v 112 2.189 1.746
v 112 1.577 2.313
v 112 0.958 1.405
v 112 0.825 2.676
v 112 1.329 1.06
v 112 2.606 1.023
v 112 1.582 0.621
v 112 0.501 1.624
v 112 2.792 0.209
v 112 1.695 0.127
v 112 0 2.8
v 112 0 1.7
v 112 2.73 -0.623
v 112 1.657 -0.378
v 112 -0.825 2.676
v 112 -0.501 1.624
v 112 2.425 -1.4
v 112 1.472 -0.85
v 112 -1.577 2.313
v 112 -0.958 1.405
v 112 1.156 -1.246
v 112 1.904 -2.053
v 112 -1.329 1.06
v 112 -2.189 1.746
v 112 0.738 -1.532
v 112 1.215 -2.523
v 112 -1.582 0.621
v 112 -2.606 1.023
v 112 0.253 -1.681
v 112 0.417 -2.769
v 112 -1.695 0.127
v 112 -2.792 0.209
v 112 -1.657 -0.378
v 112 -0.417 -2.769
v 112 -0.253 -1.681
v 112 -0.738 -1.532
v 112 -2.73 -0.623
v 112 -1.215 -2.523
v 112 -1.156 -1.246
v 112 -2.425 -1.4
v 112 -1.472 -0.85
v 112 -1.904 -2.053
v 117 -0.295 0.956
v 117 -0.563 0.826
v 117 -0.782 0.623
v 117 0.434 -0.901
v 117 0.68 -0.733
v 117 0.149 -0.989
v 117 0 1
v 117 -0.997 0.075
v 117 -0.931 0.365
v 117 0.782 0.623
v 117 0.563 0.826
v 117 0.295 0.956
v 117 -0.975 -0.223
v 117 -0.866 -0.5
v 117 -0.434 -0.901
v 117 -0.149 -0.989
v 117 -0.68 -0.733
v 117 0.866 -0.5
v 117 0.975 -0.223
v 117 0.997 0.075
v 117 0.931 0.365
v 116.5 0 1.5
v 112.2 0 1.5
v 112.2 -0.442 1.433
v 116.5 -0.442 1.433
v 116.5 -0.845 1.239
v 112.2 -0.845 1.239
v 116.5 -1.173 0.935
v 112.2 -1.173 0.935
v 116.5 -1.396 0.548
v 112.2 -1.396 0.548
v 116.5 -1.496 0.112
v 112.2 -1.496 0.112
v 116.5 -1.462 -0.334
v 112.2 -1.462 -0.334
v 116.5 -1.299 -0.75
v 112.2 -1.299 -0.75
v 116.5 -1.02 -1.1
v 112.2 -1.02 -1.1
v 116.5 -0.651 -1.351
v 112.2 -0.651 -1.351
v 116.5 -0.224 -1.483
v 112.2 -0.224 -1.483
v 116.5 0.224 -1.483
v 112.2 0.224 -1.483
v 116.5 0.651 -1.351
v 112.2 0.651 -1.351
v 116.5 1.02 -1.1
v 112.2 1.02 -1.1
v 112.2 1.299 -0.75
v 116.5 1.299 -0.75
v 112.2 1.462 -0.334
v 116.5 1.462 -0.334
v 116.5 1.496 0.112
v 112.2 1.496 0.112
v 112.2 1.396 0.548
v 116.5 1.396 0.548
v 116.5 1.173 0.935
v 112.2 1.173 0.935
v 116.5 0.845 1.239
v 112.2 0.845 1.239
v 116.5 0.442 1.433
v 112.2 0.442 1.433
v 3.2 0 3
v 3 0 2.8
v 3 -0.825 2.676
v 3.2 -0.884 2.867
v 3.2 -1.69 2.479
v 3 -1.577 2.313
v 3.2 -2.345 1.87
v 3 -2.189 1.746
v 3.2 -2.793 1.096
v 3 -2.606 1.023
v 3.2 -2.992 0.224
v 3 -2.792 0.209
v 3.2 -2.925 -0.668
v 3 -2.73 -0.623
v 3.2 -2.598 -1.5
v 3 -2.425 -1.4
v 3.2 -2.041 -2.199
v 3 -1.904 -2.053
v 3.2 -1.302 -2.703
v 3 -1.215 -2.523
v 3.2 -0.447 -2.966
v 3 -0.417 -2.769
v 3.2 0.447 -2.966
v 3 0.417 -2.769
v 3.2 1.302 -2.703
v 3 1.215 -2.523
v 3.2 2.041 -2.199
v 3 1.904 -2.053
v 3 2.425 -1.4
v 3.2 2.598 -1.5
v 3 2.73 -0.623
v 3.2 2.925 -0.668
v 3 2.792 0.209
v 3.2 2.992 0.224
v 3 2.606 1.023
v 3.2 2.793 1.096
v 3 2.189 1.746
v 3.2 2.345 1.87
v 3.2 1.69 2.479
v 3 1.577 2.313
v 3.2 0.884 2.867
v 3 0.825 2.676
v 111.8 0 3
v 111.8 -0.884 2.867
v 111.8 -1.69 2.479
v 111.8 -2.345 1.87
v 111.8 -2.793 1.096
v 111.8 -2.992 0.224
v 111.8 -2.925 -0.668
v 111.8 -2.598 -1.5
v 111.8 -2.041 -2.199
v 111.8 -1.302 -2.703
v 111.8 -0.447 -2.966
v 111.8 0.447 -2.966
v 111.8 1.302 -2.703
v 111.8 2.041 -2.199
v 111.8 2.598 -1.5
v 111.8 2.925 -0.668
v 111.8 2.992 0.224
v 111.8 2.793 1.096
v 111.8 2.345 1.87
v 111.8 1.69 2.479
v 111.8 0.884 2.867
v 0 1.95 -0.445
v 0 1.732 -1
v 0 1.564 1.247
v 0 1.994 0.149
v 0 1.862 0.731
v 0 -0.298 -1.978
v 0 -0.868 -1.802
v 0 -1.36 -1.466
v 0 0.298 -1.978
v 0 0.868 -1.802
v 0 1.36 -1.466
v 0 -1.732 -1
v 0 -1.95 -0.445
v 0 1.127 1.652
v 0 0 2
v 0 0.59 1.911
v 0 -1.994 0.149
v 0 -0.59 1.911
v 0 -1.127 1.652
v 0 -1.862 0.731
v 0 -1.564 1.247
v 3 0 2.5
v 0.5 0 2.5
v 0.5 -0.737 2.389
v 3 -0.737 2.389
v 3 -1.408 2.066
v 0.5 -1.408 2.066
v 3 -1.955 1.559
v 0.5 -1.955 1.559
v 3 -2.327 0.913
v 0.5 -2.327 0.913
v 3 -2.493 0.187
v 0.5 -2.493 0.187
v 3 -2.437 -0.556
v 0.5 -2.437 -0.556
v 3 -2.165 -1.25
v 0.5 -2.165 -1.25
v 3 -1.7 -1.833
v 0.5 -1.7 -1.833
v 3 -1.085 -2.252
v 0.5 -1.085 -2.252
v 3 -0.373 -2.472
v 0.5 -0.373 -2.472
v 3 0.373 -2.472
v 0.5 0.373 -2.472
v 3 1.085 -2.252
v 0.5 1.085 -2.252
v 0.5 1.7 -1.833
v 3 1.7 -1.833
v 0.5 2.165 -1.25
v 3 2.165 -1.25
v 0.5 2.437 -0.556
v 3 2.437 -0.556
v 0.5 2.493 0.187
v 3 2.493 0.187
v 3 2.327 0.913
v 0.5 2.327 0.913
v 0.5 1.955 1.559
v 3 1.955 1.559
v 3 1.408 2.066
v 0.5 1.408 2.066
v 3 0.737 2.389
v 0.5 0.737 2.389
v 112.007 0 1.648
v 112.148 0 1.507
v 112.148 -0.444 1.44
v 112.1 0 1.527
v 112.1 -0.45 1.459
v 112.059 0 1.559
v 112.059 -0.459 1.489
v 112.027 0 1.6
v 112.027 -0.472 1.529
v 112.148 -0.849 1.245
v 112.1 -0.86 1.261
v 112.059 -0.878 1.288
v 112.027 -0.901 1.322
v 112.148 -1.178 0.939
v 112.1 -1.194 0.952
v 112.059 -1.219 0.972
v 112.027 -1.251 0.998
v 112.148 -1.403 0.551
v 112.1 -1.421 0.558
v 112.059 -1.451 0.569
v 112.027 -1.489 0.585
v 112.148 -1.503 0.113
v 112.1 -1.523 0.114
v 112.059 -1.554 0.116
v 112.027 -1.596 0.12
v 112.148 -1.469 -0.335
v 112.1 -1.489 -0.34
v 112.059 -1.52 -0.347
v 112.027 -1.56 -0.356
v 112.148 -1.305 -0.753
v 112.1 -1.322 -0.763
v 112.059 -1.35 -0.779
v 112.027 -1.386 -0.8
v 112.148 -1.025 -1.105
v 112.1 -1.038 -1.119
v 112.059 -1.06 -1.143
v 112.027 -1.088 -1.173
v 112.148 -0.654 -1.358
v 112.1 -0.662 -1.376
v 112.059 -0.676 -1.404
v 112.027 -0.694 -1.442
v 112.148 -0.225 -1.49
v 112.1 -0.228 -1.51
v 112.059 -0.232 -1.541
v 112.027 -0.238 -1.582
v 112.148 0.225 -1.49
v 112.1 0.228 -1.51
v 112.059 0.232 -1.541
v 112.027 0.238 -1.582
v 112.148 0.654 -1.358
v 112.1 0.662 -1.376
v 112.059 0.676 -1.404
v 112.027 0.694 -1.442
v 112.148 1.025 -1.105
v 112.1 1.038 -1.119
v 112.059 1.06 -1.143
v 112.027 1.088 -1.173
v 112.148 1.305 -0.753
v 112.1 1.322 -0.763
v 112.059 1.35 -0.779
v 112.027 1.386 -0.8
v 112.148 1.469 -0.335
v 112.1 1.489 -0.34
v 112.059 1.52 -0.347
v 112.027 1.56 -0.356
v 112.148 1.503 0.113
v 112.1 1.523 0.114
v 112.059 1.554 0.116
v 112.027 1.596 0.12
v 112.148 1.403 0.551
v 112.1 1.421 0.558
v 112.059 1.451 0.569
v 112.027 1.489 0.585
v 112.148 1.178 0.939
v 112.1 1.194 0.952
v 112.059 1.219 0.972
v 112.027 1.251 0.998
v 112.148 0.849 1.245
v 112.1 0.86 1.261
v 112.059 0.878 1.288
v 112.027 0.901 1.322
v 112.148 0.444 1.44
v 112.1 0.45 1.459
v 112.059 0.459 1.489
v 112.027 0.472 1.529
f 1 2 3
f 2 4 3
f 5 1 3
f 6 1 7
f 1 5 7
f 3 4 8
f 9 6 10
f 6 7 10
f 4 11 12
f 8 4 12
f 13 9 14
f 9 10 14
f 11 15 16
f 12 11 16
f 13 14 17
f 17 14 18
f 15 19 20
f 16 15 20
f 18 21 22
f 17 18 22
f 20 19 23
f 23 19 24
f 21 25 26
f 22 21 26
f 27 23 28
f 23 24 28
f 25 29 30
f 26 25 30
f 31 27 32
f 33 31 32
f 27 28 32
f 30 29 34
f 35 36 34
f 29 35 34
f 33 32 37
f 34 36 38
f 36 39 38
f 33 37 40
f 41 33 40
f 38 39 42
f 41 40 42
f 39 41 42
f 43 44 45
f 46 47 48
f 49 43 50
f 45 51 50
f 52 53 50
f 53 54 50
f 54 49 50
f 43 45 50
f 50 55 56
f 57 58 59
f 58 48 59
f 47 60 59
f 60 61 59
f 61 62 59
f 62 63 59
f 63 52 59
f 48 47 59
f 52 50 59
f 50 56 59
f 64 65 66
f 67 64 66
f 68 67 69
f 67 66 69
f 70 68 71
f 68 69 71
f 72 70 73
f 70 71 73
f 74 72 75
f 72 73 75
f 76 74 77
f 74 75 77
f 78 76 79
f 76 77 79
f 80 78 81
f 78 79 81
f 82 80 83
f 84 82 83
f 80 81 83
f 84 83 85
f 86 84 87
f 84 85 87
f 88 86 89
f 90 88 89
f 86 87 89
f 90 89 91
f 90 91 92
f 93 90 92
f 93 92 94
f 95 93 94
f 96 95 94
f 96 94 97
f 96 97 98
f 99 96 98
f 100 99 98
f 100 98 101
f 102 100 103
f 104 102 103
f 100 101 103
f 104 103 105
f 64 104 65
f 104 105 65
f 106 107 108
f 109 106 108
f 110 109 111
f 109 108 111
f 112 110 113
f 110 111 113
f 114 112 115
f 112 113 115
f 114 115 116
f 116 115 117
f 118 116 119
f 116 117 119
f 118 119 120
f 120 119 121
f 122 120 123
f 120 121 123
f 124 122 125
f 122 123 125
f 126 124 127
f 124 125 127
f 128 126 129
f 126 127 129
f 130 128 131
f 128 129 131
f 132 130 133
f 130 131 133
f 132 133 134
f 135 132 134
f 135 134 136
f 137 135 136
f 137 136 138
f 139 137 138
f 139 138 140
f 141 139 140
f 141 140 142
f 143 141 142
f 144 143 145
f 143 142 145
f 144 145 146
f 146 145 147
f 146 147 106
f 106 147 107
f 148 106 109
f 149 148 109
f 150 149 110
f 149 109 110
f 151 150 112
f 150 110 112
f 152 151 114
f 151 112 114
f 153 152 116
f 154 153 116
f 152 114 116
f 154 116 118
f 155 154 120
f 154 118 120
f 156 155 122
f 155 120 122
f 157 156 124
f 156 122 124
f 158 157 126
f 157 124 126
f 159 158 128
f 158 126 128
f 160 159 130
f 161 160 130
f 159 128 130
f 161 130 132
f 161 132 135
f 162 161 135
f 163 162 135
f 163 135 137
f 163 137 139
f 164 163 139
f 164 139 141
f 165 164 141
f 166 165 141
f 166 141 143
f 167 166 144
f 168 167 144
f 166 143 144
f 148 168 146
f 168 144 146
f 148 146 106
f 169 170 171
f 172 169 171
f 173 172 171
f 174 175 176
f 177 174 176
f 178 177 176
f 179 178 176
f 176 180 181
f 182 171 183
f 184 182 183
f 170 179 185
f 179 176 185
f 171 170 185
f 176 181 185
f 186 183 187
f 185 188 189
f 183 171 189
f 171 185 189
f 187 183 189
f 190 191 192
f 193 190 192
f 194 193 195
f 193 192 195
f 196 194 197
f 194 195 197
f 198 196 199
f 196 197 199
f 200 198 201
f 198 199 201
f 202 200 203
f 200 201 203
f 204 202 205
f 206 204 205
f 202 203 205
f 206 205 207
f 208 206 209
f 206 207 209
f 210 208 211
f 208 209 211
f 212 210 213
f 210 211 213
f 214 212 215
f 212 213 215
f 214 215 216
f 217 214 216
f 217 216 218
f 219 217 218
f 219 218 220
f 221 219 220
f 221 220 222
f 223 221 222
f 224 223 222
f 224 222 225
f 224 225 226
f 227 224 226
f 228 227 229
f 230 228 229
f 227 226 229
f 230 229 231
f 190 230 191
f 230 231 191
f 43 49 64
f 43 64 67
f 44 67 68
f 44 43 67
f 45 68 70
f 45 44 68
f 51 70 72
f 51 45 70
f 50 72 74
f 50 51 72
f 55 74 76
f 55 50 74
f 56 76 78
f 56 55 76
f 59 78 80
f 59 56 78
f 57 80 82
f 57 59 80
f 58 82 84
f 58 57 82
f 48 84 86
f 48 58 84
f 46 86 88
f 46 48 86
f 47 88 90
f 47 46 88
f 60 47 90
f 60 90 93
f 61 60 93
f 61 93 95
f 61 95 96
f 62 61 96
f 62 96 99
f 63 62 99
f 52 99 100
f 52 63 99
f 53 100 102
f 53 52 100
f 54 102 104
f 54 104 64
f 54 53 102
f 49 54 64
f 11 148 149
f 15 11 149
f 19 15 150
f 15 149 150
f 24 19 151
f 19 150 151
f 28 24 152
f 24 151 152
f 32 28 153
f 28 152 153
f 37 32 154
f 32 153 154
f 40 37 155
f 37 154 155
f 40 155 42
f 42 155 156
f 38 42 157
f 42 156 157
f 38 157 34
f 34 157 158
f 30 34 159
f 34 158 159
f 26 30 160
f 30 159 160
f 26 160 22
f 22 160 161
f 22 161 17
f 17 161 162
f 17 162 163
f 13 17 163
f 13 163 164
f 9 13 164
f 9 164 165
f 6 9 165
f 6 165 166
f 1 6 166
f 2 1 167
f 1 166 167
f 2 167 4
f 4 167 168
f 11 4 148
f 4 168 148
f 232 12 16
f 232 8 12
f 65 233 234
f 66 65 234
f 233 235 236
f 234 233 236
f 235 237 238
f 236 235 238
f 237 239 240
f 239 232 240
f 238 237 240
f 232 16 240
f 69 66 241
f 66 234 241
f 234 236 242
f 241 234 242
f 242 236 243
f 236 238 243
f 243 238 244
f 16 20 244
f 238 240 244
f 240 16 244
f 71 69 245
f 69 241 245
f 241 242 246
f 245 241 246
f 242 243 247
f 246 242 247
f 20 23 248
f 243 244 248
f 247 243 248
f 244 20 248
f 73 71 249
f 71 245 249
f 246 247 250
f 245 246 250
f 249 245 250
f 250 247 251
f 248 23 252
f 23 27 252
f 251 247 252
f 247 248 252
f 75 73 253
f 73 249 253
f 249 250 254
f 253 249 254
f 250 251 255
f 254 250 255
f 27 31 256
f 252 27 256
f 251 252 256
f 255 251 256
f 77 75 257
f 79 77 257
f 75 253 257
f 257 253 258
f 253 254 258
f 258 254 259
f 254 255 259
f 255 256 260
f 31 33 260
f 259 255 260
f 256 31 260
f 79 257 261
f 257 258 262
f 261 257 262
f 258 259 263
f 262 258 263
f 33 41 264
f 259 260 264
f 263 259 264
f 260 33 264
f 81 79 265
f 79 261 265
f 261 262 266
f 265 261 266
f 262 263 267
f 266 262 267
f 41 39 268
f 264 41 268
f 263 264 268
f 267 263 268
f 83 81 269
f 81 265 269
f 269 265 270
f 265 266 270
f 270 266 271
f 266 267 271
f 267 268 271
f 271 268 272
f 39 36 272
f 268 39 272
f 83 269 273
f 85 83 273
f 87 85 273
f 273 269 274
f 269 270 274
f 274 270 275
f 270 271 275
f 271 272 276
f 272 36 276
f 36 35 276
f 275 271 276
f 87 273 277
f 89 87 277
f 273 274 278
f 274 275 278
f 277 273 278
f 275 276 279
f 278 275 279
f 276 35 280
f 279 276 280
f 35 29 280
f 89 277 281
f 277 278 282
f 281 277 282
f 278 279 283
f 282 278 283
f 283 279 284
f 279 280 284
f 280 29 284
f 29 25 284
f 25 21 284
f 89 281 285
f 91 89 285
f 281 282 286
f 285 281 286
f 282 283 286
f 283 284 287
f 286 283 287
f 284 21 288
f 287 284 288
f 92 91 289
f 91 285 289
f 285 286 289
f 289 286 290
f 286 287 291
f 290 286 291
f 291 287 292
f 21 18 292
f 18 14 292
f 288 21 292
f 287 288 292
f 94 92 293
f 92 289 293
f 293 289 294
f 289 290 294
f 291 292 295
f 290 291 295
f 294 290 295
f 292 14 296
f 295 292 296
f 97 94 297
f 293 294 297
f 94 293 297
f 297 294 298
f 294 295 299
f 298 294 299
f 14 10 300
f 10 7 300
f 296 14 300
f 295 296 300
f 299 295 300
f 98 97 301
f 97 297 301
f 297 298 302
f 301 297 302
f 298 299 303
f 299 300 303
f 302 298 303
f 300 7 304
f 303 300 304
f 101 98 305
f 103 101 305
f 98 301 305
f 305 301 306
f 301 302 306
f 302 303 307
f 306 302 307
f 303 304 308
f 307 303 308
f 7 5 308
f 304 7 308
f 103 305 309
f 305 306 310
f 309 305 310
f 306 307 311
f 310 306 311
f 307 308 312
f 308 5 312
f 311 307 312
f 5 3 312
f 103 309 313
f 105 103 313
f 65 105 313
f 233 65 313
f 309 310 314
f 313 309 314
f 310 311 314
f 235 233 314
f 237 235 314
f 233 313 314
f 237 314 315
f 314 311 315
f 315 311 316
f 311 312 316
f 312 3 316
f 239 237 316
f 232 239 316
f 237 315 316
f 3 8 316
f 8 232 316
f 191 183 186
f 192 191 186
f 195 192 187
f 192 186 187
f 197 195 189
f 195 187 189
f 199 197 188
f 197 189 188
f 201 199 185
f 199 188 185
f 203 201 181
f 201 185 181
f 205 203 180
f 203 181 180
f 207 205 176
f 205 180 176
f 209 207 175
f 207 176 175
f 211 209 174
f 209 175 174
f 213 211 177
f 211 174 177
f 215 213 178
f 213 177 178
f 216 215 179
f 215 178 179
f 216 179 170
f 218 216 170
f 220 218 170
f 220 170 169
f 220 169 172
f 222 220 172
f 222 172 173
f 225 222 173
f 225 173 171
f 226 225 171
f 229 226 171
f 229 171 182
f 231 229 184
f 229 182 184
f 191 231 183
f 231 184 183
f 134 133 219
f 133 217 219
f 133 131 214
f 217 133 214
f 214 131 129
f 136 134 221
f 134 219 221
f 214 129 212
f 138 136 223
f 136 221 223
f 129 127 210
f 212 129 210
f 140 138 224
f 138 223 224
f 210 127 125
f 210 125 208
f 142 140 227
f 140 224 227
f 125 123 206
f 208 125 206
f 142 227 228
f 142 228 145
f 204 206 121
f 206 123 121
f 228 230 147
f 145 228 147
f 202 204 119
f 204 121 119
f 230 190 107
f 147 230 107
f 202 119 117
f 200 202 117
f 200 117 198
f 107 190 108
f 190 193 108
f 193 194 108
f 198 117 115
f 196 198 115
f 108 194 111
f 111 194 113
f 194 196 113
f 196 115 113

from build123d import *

# Parameters (mm, degrees)
CHAMFER1_SIZE = 0.2
CHAMFER2_SIZE = 0.2
CHAMFER3_SIZE = 0.5
CHAMFER4_SIZE = 0.5
FILLET2_R     = 0.2


with BuildPart() as part:
    # Sketch1 → Revolve1 (revolve)
    with BuildSketch(Plane.XY):
        Polygon((0, 0), (117, 0), (117, 1.5), (112, 1.5), (112, 3), (3, 3), (3, 2.5), (0, 2.5), align=None)
    revolve(axis=Axis((0, 0, 0), (1, 0, 0)))

    # Chamfer1
    chamfer1_edges = [part.edges().sort_by_distance(p)[0] for p in [
        (112, -3, 0),
    ]]
    chamfer(chamfer1_edges, length=CHAMFER1_SIZE)

    # Chamfer2
    chamfer2_edges = [part.edges().sort_by_distance(p)[0] for p in [
        (3, -3, 0),
    ]]
    chamfer(chamfer2_edges, length=CHAMFER2_SIZE)

    # Chamfer3
    chamfer3_edges = [part.edges().sort_by_distance(p)[0] for p in [
        (0, -2.5, 0),
    ]]
    chamfer(chamfer3_edges, length=CHAMFER3_SIZE)

    # Chamfer4
    chamfer4_edges = [part.edges().sort_by_distance(p)[0] for p in [
        (117, -1.5, 0),
    ]]
    chamfer(chamfer4_edges, length=CHAMFER4_SIZE)

    # Fillet2
    fillet2_edges = [part.edges().sort_by_distance(p)[0] for p in [
        (112, -1.5, 0),
    ]]
    fillet(fillet2_edges, radius=FILLET2_R)


solid = part.part
